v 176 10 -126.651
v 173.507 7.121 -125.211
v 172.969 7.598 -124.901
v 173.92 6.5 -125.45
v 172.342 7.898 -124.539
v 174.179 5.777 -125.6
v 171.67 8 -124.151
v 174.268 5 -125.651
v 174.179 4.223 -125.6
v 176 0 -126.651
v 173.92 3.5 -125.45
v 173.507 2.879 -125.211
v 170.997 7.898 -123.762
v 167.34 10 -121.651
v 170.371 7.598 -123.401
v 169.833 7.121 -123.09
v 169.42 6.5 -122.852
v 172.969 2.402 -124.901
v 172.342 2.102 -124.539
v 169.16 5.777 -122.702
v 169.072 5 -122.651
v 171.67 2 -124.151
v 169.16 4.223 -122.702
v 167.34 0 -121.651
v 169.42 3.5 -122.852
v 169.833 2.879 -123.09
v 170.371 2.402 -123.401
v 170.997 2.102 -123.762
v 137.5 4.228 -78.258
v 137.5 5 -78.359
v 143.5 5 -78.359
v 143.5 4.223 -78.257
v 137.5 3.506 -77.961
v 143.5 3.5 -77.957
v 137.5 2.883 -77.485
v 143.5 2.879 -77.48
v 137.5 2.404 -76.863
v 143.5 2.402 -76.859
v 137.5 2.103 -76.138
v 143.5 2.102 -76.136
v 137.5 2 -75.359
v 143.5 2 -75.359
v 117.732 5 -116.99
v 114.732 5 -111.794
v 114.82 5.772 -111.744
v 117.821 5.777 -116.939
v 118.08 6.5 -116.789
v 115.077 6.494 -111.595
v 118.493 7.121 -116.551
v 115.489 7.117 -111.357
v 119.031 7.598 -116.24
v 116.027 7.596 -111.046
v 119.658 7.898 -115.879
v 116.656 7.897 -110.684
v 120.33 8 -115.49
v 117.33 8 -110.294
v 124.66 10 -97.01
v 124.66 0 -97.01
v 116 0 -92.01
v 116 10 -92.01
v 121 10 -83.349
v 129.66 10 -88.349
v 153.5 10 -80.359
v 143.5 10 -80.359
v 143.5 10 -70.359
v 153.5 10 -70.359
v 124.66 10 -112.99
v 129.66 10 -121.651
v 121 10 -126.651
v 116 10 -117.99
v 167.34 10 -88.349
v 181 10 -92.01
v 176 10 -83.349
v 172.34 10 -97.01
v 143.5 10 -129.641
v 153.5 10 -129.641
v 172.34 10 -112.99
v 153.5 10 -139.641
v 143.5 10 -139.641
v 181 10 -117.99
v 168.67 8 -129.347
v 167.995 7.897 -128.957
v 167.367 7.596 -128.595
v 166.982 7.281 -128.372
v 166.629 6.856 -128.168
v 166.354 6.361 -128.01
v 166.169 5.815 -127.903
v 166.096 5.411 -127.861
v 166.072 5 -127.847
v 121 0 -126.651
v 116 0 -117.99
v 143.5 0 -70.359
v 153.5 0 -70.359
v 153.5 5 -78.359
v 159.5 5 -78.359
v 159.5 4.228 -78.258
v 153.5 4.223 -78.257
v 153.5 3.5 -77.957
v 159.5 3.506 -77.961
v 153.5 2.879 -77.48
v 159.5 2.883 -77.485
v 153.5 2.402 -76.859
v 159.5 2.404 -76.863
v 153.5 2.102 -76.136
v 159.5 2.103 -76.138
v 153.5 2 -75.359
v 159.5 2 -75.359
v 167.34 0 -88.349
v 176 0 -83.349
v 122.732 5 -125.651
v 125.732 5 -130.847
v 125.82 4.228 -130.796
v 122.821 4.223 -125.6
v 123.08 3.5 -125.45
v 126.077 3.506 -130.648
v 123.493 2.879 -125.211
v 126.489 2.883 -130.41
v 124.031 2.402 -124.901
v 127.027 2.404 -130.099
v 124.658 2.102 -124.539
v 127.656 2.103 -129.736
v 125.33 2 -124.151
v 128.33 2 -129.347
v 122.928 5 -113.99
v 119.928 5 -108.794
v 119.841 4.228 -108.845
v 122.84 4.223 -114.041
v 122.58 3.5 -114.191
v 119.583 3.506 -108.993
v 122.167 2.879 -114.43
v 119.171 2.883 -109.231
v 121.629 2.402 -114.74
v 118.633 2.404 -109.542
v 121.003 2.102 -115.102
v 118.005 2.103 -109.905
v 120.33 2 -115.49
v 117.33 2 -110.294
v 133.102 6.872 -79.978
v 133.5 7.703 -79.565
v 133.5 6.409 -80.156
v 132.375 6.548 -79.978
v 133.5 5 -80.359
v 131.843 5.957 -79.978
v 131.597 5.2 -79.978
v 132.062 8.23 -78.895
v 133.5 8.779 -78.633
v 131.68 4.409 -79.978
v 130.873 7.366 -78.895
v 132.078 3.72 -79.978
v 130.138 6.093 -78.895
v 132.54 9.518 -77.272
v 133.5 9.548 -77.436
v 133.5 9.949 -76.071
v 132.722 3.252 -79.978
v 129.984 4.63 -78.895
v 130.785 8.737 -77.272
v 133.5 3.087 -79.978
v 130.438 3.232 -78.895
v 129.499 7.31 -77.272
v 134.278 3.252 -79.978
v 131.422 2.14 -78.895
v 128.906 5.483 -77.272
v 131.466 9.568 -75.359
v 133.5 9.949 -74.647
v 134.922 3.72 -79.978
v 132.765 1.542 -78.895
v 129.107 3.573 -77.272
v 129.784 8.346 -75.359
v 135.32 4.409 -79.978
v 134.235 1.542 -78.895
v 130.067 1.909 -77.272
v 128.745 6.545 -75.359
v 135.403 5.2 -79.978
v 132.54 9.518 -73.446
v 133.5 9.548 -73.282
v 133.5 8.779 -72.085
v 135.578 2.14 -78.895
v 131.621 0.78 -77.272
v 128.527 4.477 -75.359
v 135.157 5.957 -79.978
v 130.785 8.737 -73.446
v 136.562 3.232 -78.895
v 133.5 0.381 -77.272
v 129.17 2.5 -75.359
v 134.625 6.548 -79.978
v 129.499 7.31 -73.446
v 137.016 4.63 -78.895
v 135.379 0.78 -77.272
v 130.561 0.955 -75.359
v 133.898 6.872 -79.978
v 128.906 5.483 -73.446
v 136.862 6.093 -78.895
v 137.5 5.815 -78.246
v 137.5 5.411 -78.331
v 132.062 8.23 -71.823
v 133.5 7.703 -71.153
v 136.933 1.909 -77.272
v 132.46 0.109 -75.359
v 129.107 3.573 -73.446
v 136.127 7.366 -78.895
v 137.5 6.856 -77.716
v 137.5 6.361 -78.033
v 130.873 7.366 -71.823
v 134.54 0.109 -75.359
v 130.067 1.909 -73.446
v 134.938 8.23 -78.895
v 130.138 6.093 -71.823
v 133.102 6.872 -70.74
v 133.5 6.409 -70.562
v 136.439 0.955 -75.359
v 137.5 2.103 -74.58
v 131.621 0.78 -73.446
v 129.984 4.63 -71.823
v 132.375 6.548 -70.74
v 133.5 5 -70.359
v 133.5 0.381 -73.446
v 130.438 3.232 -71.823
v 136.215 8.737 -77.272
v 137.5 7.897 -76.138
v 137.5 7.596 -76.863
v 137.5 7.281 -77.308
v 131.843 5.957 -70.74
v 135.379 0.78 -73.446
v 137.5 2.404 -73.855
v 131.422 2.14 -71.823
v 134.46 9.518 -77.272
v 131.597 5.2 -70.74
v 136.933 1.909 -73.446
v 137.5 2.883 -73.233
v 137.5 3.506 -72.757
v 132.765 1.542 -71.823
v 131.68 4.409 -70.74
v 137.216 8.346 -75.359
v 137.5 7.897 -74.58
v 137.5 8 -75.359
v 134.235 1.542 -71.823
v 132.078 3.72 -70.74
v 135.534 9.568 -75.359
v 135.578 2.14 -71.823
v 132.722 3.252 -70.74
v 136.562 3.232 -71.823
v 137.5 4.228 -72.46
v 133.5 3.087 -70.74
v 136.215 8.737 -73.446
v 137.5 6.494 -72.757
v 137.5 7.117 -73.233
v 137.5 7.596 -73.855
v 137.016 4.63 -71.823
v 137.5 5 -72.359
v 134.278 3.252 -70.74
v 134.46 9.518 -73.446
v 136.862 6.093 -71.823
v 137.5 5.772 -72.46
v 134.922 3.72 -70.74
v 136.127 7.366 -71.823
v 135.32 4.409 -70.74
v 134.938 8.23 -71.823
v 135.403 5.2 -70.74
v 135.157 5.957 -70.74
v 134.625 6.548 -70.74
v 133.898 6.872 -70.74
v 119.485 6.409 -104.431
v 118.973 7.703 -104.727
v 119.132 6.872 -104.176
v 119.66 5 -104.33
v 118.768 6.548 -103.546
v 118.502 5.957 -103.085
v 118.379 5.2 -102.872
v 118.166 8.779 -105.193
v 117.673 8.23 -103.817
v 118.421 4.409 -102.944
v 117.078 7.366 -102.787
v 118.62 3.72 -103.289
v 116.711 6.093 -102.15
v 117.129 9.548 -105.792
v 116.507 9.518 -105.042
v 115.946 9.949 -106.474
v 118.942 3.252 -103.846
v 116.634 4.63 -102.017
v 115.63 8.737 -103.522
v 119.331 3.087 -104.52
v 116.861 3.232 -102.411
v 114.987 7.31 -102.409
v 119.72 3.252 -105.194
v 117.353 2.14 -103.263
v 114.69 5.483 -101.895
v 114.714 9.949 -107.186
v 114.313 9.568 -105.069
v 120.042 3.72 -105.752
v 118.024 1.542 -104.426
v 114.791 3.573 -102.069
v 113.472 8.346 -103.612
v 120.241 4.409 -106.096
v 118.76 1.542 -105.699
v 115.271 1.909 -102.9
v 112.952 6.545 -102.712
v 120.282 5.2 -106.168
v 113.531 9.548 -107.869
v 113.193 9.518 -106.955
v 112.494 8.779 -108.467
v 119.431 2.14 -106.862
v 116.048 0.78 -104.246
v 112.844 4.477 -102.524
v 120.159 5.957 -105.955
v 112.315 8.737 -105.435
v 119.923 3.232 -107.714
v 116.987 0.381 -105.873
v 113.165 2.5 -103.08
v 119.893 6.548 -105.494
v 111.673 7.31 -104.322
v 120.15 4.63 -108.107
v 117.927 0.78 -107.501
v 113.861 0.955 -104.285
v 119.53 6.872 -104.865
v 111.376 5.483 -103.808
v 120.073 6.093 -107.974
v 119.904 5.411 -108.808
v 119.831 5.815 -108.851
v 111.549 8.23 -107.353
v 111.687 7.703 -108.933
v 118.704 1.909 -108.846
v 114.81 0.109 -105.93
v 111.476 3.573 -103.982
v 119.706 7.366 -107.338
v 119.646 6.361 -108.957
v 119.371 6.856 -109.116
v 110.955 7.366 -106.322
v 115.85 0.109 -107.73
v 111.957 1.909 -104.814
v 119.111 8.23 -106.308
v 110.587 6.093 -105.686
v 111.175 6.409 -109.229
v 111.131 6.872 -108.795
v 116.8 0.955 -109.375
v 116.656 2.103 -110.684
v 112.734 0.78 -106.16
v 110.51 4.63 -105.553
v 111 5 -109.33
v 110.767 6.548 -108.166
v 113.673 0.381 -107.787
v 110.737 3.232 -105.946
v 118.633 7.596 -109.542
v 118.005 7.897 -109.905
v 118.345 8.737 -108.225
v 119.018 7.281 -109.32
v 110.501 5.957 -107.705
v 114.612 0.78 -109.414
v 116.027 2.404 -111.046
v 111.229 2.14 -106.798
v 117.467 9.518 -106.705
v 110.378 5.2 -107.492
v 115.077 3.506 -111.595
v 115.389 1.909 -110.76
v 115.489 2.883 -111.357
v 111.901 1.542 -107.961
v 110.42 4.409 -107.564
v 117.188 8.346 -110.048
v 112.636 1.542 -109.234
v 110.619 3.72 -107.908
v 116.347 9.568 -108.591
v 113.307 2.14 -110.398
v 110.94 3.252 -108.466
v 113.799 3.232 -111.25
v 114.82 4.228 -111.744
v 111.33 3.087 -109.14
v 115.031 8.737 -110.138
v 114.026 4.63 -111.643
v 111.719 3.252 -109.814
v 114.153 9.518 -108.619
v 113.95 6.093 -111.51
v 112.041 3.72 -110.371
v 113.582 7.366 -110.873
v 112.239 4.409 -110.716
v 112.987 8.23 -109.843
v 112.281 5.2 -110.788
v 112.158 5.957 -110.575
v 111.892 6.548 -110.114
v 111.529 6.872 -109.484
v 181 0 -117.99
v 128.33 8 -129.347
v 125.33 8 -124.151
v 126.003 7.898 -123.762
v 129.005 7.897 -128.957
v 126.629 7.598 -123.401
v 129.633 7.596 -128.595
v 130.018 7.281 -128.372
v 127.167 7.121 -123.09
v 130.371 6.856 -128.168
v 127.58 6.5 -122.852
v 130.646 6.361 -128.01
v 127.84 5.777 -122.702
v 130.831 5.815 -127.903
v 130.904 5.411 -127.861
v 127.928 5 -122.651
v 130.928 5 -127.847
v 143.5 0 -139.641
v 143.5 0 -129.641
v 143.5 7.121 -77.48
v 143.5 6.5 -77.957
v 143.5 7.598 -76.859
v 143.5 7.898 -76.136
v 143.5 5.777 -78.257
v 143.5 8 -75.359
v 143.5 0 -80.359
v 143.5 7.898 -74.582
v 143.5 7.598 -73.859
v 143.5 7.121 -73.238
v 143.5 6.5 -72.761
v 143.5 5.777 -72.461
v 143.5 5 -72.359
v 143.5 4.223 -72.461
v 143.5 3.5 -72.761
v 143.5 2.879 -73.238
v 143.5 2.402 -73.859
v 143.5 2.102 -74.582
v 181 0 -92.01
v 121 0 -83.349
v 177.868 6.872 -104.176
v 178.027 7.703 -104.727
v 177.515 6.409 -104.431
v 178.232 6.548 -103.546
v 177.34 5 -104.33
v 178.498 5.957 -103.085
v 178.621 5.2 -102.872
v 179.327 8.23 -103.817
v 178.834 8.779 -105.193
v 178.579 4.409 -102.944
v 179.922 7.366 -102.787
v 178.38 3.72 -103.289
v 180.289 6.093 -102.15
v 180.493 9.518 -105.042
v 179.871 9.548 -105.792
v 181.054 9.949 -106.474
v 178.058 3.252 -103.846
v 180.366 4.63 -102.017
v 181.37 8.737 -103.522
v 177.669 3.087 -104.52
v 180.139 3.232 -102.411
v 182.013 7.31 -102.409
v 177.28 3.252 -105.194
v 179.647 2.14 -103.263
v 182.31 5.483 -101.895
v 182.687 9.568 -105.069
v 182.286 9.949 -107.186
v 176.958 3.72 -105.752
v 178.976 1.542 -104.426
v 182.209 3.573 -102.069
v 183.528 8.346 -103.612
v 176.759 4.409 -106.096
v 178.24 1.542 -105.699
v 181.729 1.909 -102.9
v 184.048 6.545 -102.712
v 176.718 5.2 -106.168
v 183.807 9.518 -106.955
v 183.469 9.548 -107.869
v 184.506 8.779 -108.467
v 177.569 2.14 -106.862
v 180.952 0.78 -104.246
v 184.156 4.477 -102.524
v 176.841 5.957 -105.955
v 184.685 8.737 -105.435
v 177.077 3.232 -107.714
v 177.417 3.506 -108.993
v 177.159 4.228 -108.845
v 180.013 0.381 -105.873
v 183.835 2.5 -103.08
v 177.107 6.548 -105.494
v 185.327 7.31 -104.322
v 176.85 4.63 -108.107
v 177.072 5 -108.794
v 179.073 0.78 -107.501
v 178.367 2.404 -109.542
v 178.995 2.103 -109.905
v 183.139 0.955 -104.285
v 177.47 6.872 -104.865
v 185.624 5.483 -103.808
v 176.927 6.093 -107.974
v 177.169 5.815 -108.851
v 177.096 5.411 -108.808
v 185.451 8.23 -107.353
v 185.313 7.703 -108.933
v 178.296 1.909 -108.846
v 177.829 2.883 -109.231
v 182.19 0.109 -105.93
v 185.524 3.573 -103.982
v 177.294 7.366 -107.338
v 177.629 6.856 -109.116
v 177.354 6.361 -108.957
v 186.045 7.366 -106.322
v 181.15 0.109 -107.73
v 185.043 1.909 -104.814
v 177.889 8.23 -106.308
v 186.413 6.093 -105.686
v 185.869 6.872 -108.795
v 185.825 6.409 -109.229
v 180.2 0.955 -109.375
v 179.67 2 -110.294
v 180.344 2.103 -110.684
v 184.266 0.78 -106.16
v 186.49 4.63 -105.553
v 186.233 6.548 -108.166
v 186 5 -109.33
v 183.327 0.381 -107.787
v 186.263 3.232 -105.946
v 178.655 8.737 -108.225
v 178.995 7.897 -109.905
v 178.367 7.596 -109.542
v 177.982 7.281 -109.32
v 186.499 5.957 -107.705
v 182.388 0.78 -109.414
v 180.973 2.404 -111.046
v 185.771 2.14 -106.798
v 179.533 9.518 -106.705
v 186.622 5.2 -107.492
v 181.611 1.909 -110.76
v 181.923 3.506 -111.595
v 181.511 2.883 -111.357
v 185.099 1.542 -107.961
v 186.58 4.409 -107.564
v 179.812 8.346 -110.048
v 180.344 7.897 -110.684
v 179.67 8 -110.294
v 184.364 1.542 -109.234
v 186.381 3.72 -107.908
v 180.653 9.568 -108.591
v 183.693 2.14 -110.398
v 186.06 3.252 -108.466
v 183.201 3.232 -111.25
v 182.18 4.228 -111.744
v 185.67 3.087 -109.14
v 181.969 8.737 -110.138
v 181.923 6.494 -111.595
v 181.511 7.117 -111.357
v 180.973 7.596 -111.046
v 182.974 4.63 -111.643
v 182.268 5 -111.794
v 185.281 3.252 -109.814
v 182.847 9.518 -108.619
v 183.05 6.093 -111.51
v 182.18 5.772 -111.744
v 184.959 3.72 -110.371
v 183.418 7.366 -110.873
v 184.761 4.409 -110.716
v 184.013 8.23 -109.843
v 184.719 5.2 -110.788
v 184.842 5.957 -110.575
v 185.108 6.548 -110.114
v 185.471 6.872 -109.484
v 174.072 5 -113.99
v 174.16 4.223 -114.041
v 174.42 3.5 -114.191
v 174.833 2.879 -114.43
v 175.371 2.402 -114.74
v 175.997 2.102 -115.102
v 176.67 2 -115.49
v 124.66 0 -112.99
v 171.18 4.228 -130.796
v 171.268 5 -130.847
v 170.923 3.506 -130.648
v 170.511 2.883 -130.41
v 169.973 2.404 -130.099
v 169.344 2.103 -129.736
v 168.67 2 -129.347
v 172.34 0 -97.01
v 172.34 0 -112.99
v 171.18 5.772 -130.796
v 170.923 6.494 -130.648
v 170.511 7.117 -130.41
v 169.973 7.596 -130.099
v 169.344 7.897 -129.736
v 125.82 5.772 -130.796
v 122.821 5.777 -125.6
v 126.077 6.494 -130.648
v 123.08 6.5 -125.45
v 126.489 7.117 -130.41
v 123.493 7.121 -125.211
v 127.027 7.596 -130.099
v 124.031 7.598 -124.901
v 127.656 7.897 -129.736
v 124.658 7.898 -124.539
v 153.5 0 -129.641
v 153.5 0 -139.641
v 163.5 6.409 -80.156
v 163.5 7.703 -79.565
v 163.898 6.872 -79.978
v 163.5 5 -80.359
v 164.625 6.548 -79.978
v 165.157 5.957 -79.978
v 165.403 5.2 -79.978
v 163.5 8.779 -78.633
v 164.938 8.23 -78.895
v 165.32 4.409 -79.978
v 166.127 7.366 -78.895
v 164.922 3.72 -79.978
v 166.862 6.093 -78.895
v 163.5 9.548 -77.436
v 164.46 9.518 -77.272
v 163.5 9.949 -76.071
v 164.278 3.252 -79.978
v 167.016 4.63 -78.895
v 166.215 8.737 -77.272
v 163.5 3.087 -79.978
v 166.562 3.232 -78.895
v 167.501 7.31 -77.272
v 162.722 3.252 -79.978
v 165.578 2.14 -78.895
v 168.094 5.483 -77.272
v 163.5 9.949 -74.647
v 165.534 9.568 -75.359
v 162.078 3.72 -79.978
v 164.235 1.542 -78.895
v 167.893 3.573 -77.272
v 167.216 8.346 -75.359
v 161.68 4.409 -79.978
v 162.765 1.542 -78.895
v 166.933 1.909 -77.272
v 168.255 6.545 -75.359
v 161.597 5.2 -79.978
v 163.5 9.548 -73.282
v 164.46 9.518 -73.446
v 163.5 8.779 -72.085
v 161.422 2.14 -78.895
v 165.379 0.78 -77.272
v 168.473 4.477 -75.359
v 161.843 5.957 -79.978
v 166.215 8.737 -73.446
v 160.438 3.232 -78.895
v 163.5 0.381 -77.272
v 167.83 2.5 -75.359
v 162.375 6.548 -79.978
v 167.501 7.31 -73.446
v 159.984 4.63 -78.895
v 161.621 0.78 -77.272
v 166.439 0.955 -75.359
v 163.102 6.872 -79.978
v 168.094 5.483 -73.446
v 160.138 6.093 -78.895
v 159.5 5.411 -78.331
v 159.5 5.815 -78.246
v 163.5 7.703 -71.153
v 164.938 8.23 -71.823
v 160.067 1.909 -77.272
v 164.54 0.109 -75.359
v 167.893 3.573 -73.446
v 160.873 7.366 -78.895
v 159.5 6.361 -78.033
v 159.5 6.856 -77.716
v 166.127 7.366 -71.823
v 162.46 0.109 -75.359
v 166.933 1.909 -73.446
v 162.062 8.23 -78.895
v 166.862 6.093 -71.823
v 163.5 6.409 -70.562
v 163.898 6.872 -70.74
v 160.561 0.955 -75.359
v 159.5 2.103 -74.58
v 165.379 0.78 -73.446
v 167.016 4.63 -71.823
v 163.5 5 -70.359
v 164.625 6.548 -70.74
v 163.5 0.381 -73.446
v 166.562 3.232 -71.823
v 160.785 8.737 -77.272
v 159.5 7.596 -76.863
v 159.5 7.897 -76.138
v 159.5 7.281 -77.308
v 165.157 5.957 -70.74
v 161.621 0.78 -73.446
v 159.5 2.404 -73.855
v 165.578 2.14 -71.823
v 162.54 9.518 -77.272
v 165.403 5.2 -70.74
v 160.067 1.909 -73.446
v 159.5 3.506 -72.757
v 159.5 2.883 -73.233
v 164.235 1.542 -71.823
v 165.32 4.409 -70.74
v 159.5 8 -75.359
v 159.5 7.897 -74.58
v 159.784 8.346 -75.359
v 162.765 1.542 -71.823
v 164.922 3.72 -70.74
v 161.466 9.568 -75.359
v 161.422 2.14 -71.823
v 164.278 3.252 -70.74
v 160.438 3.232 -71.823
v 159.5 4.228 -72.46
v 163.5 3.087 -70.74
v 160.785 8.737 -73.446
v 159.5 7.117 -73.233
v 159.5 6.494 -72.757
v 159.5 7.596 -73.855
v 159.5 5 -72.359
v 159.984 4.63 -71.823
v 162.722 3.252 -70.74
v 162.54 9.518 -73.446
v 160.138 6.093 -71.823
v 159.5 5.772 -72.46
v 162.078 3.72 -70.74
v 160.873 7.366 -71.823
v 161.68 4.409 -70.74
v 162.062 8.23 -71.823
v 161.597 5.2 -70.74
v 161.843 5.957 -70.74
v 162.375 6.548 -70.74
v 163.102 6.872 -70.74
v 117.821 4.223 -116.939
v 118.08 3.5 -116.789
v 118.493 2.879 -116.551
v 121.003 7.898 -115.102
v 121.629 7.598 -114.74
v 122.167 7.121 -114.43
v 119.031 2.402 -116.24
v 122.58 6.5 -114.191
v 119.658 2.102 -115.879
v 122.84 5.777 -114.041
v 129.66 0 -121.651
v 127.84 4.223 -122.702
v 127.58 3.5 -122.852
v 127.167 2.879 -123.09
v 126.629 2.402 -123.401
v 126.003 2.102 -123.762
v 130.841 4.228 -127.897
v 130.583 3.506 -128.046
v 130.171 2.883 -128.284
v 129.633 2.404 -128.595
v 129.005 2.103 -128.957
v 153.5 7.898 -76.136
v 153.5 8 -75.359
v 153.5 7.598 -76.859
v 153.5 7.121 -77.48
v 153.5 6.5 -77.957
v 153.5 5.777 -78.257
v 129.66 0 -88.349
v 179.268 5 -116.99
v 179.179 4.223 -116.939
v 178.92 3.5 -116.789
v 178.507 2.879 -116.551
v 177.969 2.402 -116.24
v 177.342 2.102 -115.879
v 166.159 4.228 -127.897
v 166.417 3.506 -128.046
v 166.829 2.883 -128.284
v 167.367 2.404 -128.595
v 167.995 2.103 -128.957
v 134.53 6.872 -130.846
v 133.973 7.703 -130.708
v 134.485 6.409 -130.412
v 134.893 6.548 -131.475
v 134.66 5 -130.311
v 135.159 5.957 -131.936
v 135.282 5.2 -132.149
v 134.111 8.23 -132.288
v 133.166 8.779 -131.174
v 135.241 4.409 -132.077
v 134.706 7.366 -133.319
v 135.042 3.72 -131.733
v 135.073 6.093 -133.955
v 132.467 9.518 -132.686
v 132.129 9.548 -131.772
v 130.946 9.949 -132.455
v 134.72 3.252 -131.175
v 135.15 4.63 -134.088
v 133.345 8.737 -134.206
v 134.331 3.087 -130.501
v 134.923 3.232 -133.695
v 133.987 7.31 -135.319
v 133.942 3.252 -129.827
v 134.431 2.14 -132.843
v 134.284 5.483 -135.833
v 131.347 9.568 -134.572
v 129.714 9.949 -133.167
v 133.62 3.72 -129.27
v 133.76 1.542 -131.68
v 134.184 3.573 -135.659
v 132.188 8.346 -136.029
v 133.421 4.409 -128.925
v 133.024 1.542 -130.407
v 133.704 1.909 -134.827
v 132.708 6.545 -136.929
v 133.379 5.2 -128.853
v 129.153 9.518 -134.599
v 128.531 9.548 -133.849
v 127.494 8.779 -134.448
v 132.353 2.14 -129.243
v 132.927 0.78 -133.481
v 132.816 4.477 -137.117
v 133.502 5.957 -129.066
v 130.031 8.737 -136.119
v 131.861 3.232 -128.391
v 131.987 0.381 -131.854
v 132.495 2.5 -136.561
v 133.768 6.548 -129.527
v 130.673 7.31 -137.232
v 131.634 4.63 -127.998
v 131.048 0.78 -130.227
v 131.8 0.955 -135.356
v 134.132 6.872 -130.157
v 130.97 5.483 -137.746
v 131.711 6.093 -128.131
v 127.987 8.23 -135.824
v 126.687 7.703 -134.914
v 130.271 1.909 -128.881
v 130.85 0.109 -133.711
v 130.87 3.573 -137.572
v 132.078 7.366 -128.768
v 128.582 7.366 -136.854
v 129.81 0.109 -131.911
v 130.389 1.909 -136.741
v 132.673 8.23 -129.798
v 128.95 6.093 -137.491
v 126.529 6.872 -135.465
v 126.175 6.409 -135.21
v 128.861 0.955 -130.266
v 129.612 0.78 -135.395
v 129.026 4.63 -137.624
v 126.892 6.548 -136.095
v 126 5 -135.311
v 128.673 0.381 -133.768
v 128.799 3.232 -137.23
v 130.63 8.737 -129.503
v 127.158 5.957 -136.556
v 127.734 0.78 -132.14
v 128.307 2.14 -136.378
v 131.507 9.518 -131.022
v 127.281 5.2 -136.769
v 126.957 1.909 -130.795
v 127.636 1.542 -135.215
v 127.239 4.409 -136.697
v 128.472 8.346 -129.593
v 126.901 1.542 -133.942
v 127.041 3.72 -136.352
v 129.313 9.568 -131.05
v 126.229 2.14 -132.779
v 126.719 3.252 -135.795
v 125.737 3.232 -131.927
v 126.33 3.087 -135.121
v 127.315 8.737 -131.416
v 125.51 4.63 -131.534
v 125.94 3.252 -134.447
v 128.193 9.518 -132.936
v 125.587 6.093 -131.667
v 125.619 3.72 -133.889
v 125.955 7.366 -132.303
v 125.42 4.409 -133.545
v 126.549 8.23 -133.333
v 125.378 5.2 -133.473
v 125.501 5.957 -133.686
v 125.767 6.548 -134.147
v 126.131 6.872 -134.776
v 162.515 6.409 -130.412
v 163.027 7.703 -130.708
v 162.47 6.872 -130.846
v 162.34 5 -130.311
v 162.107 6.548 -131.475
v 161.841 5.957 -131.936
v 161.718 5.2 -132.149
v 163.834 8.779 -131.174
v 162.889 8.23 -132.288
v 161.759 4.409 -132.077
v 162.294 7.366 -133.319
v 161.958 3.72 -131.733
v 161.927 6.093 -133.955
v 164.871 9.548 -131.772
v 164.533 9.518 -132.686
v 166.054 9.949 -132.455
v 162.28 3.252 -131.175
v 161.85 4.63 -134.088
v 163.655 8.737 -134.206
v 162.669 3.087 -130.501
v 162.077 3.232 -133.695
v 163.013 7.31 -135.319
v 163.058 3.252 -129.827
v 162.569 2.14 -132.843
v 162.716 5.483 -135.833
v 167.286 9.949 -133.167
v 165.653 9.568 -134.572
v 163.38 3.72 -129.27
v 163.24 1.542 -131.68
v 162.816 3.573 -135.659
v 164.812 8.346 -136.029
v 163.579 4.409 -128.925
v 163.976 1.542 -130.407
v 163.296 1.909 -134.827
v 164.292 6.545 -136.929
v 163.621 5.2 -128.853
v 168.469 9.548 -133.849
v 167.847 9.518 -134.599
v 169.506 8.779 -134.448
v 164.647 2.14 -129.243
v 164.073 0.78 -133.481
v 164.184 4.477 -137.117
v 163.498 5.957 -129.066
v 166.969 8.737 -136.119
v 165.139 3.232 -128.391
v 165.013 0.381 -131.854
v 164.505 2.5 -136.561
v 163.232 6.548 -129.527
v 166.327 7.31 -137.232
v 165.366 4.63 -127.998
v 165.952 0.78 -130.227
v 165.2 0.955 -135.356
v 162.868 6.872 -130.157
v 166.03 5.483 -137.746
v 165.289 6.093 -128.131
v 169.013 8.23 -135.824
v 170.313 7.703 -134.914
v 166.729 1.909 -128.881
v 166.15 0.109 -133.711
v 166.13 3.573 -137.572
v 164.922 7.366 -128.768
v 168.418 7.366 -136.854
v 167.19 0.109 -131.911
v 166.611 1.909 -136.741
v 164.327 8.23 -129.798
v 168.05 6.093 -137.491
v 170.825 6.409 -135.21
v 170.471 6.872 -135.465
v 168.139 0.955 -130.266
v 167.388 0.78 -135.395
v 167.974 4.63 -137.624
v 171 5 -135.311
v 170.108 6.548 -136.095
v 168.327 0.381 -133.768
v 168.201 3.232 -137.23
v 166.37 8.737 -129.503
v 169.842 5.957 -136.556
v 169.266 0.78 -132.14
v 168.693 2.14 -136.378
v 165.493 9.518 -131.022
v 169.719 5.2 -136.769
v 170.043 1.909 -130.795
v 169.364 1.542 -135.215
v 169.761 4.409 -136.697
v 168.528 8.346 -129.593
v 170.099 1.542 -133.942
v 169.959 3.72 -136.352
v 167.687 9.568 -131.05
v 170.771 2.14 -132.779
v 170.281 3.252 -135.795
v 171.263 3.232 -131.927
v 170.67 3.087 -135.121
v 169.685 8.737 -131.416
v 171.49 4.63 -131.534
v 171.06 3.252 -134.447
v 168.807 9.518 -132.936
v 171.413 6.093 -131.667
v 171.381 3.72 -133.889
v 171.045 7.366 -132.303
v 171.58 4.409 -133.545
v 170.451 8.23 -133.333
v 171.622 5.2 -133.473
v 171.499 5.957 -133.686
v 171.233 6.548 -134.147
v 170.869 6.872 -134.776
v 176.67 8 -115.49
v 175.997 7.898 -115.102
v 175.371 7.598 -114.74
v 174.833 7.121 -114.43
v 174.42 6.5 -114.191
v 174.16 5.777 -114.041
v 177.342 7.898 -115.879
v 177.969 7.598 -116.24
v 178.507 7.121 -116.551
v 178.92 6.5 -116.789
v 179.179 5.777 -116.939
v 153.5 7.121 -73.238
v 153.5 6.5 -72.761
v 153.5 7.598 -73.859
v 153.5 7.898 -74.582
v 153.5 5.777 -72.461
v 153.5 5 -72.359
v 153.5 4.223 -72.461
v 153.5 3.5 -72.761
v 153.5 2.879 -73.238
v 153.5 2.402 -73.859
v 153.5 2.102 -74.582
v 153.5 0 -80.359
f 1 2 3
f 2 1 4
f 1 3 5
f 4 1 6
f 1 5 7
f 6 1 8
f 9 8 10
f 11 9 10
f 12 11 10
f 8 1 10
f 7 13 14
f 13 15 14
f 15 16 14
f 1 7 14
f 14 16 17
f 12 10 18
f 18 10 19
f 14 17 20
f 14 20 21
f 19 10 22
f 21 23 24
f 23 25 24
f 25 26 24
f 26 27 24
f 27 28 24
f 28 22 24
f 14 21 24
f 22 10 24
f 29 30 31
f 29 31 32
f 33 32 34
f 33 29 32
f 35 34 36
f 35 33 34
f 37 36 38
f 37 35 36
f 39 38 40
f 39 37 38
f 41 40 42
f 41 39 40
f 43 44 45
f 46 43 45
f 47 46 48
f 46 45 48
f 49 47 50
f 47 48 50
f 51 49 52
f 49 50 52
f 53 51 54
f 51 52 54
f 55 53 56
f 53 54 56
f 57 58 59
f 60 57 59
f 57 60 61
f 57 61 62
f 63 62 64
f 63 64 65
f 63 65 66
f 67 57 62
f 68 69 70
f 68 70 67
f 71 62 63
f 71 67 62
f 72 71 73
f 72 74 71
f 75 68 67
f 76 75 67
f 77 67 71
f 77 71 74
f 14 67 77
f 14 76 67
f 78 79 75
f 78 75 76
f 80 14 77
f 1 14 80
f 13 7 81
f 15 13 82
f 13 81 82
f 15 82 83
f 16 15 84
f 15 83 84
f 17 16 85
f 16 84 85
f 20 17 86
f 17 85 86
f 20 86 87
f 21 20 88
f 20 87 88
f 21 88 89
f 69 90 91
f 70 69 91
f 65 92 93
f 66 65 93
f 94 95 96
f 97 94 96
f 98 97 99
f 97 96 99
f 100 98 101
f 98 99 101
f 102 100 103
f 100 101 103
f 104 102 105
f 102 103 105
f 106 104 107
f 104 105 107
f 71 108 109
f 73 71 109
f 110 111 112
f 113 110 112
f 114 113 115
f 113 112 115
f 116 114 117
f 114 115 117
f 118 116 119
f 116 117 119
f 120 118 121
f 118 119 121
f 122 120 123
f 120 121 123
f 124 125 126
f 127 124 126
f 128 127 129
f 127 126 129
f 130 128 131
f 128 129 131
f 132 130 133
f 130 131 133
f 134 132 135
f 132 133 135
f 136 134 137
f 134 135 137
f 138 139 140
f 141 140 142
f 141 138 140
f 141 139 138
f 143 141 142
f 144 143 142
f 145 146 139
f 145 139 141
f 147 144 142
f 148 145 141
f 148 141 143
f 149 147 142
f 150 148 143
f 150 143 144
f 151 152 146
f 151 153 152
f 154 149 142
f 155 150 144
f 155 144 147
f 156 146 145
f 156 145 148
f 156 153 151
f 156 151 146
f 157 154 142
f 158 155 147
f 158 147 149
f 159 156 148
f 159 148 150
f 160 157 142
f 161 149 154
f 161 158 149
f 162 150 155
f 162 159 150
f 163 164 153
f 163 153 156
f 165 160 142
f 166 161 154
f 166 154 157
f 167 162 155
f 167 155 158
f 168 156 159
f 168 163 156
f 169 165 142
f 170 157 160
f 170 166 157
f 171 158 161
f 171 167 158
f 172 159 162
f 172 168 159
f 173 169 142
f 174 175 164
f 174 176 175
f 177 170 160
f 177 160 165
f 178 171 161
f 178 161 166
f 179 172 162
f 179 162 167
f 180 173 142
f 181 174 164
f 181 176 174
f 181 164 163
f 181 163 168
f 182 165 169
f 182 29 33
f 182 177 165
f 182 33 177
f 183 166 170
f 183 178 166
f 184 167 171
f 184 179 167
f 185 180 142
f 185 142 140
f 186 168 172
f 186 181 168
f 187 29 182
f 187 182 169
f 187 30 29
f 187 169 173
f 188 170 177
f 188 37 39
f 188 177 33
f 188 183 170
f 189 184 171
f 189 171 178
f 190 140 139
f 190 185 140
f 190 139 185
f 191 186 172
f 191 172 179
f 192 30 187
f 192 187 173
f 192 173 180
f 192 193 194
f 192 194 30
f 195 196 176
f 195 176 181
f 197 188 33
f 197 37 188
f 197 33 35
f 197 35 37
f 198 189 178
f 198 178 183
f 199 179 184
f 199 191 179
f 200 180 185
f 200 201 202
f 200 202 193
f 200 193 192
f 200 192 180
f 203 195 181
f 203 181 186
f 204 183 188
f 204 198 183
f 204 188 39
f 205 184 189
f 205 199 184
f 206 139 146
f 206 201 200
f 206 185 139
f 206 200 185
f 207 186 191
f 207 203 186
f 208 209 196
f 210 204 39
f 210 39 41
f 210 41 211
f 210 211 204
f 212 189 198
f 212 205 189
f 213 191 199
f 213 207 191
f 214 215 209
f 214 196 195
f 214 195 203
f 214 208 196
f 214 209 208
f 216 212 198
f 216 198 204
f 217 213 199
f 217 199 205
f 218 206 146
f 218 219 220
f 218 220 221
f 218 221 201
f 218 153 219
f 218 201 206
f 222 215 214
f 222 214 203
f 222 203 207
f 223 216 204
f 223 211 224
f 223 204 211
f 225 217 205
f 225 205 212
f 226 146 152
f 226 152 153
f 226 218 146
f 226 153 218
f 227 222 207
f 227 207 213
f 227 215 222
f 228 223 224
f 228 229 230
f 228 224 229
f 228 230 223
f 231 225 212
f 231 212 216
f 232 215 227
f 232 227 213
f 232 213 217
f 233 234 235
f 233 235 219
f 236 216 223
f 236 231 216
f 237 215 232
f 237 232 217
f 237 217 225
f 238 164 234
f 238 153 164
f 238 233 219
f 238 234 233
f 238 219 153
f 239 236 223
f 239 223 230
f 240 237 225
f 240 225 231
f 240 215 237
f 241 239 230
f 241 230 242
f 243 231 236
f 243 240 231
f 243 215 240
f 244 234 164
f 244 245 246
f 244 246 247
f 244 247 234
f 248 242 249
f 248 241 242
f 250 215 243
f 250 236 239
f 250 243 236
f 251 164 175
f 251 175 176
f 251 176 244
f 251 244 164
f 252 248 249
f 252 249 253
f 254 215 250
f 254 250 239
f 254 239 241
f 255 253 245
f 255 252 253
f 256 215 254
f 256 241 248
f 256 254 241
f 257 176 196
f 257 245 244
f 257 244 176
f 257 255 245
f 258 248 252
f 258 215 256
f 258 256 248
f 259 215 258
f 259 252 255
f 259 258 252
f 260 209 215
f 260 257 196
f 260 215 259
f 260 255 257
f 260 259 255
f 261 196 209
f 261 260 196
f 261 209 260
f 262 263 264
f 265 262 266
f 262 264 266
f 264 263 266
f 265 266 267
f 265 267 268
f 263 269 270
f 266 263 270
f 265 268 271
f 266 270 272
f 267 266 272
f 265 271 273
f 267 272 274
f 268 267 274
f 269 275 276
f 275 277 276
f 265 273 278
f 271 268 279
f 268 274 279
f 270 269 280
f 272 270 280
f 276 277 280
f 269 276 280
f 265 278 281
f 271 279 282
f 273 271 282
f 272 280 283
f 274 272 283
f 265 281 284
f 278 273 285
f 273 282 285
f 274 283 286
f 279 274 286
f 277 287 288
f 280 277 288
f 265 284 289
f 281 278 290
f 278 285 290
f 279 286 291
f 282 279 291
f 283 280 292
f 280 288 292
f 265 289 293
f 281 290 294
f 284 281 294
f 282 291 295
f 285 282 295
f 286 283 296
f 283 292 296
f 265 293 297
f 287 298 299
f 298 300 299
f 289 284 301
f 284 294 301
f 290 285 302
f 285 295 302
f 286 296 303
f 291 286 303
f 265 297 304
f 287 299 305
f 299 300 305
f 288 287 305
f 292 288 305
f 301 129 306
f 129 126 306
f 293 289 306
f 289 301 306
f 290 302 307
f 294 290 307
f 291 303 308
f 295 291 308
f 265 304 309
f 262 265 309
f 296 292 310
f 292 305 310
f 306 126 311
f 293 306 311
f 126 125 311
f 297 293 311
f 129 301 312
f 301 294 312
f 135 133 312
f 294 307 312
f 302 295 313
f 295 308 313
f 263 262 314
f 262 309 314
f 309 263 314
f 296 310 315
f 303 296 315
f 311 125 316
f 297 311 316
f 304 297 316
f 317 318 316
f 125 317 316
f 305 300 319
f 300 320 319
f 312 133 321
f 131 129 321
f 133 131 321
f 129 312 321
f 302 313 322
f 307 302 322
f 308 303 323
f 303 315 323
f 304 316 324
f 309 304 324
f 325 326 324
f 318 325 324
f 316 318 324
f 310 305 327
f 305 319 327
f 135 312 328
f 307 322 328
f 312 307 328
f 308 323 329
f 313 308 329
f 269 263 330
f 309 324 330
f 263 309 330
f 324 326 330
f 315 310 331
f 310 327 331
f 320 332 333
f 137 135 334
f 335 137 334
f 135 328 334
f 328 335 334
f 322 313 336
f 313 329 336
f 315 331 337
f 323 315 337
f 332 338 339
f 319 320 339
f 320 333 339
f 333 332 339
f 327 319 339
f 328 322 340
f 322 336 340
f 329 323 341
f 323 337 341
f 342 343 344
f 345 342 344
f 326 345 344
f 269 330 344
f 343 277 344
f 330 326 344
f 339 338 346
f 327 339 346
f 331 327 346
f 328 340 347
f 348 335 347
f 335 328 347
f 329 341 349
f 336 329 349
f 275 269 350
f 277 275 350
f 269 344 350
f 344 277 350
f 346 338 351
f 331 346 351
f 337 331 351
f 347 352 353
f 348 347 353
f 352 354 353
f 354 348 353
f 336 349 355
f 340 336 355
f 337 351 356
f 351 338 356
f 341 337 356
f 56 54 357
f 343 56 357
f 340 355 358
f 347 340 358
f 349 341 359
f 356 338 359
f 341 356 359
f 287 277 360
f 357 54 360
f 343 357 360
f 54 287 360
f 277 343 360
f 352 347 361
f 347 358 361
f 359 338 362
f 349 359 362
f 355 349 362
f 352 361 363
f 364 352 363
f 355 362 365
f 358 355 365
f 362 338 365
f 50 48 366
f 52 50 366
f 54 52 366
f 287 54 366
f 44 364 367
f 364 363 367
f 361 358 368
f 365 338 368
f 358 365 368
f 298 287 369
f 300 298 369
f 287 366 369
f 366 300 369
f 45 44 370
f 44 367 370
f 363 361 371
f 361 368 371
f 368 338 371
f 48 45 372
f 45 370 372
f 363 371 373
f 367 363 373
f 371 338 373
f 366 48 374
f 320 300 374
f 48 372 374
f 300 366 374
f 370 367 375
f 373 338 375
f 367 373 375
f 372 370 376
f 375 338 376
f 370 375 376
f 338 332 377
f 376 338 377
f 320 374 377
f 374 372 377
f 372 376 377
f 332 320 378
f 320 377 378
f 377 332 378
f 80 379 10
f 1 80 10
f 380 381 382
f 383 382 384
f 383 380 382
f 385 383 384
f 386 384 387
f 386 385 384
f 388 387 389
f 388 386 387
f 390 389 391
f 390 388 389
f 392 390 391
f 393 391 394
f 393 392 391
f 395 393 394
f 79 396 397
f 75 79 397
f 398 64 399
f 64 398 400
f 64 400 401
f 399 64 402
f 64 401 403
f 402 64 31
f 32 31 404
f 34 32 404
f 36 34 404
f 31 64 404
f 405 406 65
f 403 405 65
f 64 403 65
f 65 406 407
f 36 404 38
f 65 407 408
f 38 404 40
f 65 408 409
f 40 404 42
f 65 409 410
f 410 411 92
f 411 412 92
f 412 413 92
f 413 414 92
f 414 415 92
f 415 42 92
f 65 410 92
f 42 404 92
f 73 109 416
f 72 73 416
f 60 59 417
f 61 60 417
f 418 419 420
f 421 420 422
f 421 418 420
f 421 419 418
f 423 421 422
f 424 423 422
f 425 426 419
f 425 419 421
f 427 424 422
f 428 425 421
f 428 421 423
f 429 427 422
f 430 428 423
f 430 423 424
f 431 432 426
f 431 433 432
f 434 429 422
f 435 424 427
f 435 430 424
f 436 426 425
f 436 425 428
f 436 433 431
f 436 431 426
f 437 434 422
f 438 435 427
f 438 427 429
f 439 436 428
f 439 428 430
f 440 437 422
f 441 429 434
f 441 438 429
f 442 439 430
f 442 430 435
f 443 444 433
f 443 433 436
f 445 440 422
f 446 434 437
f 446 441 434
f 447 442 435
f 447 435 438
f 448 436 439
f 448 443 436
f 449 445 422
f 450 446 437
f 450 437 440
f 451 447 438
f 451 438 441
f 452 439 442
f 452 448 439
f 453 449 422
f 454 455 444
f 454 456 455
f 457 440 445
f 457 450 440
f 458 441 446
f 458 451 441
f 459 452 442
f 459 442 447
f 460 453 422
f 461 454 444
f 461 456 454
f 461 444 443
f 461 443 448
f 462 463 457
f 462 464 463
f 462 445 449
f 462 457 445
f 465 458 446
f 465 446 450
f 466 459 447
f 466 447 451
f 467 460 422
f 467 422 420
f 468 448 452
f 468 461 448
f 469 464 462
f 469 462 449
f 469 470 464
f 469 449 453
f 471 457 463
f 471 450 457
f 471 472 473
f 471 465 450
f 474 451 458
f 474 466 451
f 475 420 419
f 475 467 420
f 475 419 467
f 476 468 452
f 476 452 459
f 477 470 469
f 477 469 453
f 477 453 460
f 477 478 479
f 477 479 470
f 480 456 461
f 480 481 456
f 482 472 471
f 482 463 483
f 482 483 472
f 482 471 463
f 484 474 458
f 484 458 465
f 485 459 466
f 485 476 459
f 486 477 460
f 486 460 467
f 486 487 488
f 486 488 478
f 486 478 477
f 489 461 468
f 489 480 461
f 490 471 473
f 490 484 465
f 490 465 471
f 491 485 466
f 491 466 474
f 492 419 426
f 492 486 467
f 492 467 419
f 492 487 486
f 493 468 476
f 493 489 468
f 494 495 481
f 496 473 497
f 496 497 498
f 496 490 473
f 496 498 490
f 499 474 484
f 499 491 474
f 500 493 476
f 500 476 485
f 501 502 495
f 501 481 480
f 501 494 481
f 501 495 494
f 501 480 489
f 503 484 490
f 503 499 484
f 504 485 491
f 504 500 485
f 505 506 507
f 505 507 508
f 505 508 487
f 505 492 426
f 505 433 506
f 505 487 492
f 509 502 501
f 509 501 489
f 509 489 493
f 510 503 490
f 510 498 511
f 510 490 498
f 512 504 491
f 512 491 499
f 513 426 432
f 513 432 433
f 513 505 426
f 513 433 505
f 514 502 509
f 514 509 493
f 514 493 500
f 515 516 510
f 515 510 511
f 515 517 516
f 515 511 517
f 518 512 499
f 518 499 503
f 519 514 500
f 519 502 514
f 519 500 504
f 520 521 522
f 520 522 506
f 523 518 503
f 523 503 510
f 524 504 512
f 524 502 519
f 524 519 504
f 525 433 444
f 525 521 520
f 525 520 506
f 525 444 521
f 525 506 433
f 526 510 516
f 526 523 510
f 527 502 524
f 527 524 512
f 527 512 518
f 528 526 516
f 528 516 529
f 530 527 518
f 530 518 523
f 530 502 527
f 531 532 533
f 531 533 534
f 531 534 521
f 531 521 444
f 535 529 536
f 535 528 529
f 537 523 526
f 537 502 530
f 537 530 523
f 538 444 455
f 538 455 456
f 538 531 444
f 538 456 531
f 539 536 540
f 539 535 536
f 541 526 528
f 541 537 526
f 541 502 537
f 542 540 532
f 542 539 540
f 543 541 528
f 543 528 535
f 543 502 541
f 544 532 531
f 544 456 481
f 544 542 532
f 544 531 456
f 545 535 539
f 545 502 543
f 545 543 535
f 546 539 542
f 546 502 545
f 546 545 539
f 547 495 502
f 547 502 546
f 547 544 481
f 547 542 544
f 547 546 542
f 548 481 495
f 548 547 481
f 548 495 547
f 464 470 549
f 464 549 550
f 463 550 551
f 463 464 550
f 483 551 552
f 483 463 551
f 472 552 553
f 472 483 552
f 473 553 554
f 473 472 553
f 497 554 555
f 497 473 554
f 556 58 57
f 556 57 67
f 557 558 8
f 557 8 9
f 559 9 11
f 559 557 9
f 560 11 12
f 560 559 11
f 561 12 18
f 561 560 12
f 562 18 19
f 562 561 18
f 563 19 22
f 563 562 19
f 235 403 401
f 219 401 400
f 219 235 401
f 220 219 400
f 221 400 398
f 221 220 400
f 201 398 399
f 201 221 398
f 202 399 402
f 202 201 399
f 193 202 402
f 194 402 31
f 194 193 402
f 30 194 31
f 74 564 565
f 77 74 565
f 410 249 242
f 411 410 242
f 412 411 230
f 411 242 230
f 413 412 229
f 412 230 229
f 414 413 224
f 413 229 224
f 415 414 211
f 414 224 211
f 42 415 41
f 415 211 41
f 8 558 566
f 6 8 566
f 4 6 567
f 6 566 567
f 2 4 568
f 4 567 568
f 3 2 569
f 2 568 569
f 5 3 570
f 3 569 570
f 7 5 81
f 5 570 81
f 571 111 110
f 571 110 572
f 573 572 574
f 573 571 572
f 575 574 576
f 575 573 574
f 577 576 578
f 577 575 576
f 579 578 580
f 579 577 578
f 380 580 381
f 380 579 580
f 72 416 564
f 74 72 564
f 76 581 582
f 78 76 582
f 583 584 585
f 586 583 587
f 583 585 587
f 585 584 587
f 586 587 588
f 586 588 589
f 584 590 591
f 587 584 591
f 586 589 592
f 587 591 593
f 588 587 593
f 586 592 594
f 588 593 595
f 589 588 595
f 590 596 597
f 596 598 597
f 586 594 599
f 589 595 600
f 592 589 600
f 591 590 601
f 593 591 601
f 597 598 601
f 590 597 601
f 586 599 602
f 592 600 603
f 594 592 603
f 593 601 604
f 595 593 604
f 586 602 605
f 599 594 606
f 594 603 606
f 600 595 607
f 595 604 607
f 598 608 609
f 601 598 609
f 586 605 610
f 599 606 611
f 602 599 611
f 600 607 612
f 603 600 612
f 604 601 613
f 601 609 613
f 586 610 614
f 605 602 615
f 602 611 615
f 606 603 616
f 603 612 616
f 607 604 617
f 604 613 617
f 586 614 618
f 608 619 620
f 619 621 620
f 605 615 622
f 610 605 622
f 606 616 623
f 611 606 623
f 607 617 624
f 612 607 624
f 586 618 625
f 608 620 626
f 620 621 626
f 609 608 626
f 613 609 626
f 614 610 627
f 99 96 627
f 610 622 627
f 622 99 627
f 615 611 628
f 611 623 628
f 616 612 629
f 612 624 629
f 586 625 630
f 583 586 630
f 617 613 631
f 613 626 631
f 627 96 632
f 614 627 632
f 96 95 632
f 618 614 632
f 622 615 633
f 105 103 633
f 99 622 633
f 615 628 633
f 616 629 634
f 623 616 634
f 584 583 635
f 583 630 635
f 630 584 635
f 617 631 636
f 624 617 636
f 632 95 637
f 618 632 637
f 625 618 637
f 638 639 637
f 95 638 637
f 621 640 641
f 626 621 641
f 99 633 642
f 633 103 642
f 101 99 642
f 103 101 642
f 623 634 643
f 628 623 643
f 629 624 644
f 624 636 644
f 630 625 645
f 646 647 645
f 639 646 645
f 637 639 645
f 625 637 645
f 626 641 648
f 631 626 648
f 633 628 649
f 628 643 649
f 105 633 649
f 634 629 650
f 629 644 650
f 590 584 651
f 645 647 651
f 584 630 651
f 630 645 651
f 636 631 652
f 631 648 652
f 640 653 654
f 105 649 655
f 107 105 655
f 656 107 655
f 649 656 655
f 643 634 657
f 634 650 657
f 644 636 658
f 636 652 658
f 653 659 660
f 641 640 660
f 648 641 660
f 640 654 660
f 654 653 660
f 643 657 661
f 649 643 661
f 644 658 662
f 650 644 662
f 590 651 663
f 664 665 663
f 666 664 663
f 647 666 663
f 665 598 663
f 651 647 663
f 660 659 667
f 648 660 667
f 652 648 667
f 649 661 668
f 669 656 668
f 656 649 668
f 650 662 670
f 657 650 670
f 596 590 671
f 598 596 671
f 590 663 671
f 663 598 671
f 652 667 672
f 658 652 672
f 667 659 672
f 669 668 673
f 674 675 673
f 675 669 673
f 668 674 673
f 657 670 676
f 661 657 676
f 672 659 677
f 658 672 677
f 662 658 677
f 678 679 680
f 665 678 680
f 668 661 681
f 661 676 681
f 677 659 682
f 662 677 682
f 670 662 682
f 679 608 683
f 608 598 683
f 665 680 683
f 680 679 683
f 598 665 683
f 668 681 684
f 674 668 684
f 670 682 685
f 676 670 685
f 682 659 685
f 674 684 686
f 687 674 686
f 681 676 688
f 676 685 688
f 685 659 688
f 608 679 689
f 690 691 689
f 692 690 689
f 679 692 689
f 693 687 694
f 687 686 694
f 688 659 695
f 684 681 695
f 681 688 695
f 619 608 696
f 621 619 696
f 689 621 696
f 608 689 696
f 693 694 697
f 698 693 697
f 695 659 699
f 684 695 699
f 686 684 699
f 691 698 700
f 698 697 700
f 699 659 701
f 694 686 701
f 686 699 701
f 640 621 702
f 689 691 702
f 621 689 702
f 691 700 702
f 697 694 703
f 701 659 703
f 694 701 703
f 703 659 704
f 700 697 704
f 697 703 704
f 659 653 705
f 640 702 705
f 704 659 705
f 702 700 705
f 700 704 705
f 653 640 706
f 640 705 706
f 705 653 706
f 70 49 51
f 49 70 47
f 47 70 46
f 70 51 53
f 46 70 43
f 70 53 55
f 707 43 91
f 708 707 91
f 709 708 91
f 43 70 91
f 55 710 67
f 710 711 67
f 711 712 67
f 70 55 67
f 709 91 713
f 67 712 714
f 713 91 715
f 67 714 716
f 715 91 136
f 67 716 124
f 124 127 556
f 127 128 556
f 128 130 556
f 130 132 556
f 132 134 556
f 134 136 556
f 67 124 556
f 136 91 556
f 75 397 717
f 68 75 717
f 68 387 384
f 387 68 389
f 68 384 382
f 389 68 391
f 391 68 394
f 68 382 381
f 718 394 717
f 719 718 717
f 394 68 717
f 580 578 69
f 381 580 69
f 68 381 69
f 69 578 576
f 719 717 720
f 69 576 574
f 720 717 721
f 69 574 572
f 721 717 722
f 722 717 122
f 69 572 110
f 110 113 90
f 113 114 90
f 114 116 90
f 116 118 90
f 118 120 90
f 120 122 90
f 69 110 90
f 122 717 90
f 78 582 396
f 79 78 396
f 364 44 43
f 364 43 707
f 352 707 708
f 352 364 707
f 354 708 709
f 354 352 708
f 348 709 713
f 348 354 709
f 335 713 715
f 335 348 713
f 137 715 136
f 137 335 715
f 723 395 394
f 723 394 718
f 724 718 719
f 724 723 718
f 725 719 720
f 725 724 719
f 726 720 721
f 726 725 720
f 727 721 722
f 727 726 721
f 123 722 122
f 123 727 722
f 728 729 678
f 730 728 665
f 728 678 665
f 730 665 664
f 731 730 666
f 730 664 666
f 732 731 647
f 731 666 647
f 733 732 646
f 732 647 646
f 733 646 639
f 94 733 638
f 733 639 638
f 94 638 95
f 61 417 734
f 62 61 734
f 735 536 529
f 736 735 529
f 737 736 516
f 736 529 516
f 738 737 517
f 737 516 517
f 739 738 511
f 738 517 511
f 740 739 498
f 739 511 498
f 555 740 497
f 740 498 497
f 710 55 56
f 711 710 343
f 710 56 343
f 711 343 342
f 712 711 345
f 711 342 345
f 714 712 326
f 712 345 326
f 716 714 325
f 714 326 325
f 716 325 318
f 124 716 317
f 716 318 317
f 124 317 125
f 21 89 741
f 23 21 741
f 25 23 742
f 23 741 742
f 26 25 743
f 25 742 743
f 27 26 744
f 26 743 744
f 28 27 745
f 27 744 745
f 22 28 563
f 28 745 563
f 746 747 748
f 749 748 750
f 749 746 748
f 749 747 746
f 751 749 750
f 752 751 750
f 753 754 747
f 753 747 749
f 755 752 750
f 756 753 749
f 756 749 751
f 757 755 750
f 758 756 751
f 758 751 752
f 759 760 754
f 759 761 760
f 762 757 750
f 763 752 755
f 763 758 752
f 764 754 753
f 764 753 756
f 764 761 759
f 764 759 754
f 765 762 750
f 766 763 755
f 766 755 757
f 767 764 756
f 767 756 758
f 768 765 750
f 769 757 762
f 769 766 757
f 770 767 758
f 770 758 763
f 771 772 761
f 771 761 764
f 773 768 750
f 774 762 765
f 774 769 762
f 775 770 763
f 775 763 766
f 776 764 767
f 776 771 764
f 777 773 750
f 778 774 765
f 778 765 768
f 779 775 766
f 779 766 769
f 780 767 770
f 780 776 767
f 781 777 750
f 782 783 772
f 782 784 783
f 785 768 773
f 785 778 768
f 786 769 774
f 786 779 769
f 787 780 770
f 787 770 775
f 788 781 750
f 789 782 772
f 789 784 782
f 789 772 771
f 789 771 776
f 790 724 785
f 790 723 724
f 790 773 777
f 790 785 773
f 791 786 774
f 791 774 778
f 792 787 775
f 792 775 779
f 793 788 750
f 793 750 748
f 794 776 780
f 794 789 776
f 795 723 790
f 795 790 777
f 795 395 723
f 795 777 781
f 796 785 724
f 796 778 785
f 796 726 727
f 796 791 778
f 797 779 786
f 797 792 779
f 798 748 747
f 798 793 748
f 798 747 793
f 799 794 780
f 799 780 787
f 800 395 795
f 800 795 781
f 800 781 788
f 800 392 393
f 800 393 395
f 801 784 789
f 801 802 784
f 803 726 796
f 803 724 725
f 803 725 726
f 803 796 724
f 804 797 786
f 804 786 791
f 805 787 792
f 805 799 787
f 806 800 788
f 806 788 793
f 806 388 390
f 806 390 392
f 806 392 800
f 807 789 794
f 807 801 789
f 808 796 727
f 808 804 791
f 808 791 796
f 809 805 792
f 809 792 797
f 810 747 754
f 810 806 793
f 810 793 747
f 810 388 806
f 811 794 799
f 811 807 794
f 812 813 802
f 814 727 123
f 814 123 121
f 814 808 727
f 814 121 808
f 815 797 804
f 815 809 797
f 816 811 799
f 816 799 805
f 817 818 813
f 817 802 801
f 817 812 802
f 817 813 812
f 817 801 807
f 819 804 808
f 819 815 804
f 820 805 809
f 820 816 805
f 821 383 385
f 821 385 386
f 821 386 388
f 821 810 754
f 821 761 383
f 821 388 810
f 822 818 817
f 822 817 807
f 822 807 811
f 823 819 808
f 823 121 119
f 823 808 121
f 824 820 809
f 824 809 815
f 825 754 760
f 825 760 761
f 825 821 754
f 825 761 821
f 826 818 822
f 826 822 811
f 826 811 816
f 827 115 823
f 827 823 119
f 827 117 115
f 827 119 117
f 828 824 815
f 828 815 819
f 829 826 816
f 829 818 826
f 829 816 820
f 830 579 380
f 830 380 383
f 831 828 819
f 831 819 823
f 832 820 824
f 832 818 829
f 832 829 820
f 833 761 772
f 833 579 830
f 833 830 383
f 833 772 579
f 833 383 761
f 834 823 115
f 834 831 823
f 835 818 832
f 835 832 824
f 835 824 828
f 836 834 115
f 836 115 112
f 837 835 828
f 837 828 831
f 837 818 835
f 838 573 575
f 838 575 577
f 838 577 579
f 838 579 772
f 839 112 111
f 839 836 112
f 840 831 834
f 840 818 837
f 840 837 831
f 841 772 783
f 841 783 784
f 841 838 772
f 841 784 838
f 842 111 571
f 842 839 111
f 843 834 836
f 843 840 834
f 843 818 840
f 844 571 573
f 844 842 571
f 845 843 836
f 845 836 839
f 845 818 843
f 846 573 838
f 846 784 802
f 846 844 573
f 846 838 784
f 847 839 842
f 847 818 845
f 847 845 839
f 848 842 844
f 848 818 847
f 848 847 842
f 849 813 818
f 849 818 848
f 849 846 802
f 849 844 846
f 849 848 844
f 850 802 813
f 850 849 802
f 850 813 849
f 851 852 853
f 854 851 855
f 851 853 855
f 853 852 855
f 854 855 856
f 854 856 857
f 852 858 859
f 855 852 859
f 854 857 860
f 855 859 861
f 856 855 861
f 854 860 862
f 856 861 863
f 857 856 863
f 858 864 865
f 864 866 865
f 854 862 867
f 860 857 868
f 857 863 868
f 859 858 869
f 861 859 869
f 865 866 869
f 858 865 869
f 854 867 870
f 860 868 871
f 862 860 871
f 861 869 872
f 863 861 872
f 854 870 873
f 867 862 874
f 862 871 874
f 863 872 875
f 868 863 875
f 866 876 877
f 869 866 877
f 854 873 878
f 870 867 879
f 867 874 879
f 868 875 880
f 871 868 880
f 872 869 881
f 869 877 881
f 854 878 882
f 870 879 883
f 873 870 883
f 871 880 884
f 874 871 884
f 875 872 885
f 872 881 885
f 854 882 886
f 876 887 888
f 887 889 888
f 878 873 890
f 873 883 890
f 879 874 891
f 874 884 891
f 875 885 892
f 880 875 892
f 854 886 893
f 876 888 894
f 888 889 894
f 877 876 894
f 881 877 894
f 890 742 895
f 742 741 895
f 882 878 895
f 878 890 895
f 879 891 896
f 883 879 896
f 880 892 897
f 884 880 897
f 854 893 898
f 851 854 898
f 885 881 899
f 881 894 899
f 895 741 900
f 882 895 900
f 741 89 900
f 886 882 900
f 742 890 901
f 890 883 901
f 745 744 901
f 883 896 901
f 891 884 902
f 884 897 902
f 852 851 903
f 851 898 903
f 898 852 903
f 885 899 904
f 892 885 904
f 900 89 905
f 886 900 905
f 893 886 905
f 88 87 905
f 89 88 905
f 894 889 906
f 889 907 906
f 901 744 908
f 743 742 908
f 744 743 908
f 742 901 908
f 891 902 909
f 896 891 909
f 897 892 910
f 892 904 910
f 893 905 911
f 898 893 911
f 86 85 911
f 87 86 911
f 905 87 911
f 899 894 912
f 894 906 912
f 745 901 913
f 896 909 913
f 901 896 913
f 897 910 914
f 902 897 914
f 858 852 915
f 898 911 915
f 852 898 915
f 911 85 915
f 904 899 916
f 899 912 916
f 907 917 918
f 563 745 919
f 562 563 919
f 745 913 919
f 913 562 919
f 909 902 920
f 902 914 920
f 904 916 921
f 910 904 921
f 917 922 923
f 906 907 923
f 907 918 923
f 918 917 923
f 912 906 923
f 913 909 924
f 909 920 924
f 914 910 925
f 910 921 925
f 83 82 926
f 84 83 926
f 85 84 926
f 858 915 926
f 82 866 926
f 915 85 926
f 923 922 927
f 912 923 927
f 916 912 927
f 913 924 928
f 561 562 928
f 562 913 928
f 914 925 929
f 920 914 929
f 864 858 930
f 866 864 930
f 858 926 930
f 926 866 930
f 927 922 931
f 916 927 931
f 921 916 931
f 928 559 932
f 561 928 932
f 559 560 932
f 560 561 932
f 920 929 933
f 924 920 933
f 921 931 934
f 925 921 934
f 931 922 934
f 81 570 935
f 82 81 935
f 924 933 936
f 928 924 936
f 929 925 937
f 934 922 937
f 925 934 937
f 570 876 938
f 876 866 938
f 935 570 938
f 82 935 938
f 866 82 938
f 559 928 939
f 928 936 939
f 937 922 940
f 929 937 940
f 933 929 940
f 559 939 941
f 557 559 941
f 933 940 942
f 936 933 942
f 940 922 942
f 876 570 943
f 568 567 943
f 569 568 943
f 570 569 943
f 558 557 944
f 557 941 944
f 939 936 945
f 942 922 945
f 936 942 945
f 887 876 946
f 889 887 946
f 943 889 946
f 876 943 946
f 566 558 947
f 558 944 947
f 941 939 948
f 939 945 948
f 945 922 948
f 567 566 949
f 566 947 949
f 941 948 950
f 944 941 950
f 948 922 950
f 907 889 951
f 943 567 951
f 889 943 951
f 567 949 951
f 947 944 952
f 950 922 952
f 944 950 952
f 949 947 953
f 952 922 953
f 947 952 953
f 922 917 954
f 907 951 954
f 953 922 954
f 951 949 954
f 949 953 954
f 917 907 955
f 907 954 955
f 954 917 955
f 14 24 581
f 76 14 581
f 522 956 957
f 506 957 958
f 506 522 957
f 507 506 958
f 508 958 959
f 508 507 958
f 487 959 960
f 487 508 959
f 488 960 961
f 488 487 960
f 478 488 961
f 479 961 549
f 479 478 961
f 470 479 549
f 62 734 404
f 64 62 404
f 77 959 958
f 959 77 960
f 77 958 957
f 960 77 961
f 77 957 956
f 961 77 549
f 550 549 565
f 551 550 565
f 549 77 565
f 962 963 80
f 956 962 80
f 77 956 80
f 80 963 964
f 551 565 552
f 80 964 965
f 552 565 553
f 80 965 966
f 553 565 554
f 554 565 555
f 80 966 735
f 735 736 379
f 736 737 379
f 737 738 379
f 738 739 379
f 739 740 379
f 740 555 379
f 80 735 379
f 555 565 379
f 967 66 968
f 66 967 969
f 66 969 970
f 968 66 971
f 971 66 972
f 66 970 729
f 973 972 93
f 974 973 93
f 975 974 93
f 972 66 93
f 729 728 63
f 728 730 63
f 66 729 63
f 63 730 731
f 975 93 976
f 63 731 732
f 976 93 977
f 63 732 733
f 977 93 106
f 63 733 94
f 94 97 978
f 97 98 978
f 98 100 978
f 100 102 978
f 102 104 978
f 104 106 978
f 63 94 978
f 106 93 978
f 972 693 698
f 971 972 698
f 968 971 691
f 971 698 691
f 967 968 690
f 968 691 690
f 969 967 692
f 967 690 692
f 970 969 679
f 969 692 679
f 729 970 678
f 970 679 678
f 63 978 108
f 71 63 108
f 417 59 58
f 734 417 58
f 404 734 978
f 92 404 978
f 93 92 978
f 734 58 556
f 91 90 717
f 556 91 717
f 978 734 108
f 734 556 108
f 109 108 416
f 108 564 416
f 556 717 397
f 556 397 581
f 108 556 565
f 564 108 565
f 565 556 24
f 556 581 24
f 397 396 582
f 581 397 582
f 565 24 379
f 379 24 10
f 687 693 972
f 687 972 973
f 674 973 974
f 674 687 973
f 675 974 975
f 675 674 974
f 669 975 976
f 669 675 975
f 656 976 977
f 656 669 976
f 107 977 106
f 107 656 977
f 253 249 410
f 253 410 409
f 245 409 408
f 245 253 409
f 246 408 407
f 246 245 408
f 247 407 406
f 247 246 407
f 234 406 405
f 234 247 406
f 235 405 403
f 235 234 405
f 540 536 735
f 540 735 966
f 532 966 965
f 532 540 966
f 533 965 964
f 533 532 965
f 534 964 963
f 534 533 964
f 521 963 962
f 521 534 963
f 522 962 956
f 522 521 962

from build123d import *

# Parameters (mm, degrees)
BOSS_EXTRUDE1_DEPTH = 10
SKETCH3_W           = 6
SKETCH3_H           = 6
BOSS_EXTRUDE2_DEPTH = 10
FILLET1_R           = 3


with BuildPart() as part:
    # Sketch2 → Boss-Extrude1 (new body)
    with BuildSketch(Plane(origin=(0, 0, 0), x_dir=(1, 0, 0), z_dir=(0, 1, 0))):
        Polygon((153.500000001, 139.641016152), (143.5, 139.641016152), (143.5, 129.641016152), (129.660254038, 121.650635095), (121, 126.650635095), (116, 117.990381057), (128.990381057, 110.490381057), (124.660254038, 97.009618943), (116, 92.009618943), (121, 83.349364905), (129.660254038, 88.349364905), (143.499999999, 80.358983848), (143.499999999, 70.358983848), (153.5, 70.358983848), (153.5, 80.358983848), (167.339745962, 88.349364905), (176, 83.349364905), (181, 92.009618944), (172.339745963, 97.009618944), (172.339745963, 112.990381057), (181.000000001, 117.990381057), (176.000000001, 126.650635095), (167.339745963, 121.650635095), (153.500000001, 129.641016152), align=None)
    extrude(amount=BOSS_EXTRUDE1_DEPTH)

    # Sketch3 → Boss-Extrude2 (add)
    with BuildSketch(Plane(origin=(153.5, 0, 0), x_dir=(0, 0, -1), z_dir=(1, 0, 0))):
        with Locations((75.358983848, 5)):
            Rectangle(SKETCH3_W, SKETCH3_H)
    extrude(amount=BOSS_EXTRUDE2_DEPTH)

    # Fillet1
    fillet1_edges = [part.edges().sort_by_distance(p)[0] for p in [
        (158.5, 8, -72.358983848),
        (158.5, 2, -72.358983848),
        (158.5, 2, -78.358983848),
        (158.5, 8, -78.358983848),
    ]]
    fillet(fillet1_edges, radius=FILLET1_R - 0.0001)  # a hair under: the kernel refuses the full size

    # Sketch4 → Revolve1 (revolve)
    with BuildSketch(Plane(origin=(163.5, 0, 0), x_dir=(0, 0, -1), z_dir=(1, 0, 0))):
        with BuildLine():
            Line((70.358983848, 5), (80.358983848, 5))
            ThreePointArc((80.358983848, 5), (75.358983848, 10), (70.358983848, 5))
        make_face()
    revolve(axis=Axis((163.5, 5, -70.358983848), (0, 0, -1)))

    # Mirror1: part across plane


with BuildPart() as part_1:
    add(part.part)
    add(part.part.mirror(Plane.ZY.offset(-148.500000001)))

    # Mirror2: part across plane


with BuildPart() as part_2:
    add(part_1.part)
    add(part_1.part.mirror(Plane(origin=(-8.3413337, 0, -14.447613772), x_dir=(-0.8660254037935928, 0, 0.4999999999841444), z_dir=(0.4999999999841445, 0, 0.8660254037935928))))

    # Mirror3: part across plane


with BuildPart() as part_3:
    add(part_2.part)
    add(part_2.part.mirror(Plane.ZY.offset(-148.500000001)))


solid = part_3.part
